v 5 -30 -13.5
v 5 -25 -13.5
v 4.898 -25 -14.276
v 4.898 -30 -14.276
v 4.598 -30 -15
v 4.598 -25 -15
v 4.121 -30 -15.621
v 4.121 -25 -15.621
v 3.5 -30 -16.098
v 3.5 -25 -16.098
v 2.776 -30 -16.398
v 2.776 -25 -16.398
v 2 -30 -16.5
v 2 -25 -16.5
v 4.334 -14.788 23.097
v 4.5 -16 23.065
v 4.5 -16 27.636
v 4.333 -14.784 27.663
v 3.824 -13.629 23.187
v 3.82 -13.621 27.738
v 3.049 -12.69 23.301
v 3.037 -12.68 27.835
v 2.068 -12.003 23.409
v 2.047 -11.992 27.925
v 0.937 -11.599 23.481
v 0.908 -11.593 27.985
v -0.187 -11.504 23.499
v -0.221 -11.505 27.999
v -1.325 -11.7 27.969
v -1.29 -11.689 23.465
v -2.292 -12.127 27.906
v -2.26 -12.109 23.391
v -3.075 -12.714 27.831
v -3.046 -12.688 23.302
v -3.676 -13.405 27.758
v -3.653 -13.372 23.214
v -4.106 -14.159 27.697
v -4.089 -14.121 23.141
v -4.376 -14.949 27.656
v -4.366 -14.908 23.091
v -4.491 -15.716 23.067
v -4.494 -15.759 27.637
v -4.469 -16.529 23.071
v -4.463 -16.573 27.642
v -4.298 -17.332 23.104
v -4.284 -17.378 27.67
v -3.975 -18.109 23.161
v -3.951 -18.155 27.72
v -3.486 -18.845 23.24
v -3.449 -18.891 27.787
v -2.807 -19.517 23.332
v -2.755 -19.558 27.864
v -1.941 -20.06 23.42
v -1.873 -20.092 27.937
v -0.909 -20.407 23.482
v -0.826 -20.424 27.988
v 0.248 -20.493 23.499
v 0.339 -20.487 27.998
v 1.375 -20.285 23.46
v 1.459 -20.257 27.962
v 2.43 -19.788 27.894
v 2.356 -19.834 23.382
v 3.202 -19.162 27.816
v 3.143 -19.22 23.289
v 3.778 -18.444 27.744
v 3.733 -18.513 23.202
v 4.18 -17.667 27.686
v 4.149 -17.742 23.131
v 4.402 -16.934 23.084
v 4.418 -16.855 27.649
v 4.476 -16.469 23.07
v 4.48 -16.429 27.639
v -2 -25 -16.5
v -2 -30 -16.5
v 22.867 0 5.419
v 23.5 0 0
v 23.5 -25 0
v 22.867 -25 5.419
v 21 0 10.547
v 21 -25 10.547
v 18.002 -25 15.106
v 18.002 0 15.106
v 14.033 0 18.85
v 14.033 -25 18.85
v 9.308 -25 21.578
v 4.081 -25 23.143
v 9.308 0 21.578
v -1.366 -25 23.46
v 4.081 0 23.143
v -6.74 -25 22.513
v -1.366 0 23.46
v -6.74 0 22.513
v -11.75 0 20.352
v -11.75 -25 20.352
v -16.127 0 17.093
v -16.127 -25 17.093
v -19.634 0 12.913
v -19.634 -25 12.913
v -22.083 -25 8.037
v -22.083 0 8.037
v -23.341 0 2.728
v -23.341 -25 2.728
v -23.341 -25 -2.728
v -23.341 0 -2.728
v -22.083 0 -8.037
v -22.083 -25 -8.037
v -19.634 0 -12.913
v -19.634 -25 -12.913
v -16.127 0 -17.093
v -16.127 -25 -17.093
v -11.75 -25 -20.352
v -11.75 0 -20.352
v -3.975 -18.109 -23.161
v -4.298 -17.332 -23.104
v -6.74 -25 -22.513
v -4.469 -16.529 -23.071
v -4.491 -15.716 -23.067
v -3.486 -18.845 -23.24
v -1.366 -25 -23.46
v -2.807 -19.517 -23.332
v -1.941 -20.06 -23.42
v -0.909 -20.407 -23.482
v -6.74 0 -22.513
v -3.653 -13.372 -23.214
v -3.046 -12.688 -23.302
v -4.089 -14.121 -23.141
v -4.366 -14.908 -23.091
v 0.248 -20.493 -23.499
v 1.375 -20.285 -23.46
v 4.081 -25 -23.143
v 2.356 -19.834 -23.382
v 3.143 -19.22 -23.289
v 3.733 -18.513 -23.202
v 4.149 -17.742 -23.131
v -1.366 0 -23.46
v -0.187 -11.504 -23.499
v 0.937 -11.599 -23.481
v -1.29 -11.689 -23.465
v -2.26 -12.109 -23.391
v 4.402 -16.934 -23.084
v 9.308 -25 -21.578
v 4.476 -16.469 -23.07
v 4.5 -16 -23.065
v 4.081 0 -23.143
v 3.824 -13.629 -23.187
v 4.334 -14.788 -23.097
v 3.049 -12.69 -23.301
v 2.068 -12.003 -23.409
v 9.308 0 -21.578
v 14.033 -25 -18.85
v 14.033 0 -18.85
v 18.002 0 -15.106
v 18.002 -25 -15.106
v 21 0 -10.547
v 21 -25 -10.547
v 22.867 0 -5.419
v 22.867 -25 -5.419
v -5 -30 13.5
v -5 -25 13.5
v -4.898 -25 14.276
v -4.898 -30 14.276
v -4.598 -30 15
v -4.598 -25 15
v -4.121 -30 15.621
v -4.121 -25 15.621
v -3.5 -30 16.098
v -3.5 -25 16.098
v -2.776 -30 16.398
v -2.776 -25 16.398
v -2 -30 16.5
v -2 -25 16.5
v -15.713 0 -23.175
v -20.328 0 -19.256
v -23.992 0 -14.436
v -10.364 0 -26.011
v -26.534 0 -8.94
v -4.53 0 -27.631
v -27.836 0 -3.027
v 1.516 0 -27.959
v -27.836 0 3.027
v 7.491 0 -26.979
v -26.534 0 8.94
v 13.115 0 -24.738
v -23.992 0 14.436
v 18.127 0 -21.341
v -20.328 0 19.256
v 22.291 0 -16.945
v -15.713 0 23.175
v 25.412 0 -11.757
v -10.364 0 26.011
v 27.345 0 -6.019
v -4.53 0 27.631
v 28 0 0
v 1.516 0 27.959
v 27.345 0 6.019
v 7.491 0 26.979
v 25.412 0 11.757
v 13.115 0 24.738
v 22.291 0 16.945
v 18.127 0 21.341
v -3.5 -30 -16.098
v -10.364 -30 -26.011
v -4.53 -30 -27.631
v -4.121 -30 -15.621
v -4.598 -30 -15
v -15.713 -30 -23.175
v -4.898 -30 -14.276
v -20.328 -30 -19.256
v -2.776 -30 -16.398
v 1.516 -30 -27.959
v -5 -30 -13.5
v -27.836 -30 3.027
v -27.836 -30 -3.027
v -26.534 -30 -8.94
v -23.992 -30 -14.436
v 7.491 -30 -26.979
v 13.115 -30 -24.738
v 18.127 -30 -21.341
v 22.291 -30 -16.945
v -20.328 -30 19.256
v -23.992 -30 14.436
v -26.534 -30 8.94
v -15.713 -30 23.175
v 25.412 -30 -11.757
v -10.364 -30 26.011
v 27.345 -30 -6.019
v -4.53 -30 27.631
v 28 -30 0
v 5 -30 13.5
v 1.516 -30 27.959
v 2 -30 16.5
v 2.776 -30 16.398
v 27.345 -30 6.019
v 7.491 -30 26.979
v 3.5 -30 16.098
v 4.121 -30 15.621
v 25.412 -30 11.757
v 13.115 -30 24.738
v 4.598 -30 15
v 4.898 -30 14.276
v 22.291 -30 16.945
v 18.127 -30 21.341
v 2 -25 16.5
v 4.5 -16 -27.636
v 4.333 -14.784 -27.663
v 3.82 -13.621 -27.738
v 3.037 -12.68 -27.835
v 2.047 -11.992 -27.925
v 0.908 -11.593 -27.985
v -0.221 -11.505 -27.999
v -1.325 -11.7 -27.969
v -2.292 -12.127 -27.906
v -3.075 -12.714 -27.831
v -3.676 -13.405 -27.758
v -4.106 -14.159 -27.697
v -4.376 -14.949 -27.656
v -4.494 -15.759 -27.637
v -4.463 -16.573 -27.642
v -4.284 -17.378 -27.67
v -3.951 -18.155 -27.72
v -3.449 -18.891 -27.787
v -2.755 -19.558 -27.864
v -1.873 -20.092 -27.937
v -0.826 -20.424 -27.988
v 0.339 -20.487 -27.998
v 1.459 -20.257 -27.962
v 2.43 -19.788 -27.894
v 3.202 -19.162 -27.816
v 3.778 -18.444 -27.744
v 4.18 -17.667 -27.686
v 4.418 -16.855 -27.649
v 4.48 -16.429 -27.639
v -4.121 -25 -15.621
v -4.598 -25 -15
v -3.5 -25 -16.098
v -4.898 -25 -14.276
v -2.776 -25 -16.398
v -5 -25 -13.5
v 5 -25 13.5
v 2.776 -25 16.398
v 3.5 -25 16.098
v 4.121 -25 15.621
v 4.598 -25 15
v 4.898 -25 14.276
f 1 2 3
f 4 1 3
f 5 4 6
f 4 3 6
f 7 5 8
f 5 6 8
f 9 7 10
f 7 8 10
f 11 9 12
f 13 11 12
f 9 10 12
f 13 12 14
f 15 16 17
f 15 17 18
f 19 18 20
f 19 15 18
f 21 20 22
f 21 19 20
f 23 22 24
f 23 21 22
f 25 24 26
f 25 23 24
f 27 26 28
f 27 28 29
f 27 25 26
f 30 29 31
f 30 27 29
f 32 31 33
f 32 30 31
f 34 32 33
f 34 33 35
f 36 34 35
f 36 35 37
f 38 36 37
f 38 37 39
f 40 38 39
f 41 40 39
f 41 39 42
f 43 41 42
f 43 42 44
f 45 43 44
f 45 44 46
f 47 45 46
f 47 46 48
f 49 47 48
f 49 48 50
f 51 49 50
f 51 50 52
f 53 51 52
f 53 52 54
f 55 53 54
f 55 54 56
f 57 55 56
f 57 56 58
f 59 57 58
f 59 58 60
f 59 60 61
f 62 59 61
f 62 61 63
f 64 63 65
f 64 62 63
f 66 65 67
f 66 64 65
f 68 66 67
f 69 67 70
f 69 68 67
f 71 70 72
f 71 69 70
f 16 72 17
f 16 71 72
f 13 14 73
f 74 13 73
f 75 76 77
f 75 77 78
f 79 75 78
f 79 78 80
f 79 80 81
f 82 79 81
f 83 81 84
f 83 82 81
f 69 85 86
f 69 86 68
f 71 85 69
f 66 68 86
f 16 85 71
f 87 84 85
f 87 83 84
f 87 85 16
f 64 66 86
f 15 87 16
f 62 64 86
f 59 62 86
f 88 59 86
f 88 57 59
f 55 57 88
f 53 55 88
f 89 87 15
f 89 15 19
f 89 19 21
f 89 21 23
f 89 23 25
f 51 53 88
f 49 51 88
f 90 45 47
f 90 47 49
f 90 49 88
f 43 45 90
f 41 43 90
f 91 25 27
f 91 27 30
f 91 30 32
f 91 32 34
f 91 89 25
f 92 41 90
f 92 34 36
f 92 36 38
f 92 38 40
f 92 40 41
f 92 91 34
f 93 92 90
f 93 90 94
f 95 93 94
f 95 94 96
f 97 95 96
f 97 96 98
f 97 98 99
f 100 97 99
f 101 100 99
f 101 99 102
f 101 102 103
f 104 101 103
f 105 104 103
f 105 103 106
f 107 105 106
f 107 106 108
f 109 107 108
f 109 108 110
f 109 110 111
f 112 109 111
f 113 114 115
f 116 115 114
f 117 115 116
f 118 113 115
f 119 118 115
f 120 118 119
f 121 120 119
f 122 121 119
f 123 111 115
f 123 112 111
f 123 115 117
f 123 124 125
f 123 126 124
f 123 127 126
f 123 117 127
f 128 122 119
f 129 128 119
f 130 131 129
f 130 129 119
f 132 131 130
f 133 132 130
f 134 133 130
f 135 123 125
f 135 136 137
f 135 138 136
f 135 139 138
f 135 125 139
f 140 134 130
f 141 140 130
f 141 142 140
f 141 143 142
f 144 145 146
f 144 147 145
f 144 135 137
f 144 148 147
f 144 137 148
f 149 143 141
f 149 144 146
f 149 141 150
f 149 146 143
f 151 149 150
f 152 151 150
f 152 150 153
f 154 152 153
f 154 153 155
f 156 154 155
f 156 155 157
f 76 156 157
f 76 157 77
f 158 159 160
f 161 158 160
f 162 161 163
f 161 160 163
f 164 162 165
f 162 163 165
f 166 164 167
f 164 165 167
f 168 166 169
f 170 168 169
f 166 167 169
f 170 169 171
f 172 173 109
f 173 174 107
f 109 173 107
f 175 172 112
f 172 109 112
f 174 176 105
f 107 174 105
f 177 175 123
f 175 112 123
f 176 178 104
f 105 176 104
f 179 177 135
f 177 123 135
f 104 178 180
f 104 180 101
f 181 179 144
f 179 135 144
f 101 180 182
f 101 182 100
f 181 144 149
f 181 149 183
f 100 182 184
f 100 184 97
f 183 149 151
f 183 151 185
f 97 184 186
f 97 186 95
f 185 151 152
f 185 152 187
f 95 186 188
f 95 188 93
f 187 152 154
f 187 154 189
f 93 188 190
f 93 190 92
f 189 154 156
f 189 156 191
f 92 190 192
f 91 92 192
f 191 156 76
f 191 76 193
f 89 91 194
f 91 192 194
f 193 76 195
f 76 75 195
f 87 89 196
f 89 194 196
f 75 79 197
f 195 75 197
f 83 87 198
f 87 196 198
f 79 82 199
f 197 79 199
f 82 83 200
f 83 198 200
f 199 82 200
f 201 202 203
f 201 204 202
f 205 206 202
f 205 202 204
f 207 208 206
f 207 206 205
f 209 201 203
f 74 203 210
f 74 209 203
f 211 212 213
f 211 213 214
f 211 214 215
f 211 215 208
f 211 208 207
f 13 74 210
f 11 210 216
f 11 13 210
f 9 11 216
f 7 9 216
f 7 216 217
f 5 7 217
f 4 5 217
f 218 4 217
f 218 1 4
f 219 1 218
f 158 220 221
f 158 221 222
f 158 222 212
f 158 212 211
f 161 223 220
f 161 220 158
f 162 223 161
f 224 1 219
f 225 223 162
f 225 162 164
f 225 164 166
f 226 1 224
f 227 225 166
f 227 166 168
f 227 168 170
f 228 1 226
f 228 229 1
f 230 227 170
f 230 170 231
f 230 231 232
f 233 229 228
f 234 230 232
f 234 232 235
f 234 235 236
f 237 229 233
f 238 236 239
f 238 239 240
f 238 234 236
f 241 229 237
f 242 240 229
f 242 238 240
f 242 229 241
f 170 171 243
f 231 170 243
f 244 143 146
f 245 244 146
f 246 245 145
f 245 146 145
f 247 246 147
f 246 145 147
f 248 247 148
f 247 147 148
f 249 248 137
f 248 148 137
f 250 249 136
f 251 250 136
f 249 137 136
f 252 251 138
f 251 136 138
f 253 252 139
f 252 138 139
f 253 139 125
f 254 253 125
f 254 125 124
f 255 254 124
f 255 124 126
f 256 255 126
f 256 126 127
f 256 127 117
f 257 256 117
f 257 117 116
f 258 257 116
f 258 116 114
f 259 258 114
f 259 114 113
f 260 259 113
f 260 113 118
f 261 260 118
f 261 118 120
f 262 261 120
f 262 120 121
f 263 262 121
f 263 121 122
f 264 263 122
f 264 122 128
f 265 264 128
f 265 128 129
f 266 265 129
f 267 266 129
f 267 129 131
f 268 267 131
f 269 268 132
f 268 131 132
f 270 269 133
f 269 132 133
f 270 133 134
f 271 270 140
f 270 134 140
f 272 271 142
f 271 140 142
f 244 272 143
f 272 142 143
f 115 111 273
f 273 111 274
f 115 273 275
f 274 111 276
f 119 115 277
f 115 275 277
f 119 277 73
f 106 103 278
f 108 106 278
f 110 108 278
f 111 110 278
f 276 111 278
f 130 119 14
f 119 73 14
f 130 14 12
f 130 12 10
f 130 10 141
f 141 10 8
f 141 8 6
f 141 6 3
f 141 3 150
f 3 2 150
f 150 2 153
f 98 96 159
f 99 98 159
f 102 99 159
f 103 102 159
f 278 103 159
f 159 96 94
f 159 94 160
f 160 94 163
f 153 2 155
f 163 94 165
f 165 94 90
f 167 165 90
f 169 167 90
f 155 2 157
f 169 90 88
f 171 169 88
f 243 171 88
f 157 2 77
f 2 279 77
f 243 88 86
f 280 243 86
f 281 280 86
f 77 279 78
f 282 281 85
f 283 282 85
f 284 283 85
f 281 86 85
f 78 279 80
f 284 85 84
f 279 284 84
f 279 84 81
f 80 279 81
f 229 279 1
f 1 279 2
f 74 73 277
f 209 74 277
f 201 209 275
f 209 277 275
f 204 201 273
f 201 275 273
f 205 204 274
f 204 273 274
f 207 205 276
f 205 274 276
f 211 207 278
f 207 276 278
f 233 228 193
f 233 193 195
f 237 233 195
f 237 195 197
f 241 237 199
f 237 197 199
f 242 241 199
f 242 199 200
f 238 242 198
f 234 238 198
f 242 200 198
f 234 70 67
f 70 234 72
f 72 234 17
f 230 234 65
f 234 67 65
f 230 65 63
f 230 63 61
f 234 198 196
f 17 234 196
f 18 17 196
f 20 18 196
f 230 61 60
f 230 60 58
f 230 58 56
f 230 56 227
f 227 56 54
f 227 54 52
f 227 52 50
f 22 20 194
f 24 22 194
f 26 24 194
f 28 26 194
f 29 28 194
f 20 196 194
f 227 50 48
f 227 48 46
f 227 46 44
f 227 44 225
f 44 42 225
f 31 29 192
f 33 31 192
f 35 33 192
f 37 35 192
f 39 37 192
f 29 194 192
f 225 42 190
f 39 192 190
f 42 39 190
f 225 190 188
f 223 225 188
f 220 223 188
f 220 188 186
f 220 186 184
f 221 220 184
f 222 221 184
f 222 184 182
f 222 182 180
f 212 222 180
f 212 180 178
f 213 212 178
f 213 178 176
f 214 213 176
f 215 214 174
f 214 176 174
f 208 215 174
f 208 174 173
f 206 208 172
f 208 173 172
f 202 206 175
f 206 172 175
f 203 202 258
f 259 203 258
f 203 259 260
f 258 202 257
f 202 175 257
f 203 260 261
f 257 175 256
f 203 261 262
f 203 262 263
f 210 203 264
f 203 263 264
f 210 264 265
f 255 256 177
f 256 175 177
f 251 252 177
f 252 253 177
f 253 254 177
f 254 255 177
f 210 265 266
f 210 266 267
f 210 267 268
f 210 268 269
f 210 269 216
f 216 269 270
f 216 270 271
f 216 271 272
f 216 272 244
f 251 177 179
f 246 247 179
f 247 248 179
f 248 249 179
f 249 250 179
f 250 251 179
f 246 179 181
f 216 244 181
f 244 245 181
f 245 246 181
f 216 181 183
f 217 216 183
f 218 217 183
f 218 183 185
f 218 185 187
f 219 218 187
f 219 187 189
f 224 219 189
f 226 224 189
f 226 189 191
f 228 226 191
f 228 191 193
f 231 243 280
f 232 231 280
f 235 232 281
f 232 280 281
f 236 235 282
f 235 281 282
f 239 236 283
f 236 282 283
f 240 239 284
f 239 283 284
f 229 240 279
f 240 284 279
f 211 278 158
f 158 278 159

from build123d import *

# Parameters (mm, degrees)
F0_R          = 28
F0_R_2        = 23.5
F1_DEPTH      = 25
F2_R          = 28
F3_DEPTH      = 5
F5_R          = 4.5
F6_DEPTH      = 50
F6_DEPTH_BACK = 50


with BuildPart() as f1:
    # F0 (on Front) → F1 (new body)
    with BuildSketch(Plane.XZ):
        Circle(F0_R)
        Circle(F0_R_2, mode=Mode.SUBTRACT)
    extrude(amount=F1_DEPTH)

    # F2 (on face) → F3 (join)
    with BuildSketch(Plane.XZ.offset(25)):
        Circle(F2_R)
        with BuildLine():
            Line((-5, -13.5), (-5, 13.5))
            ThreePointArc((-5, 13.5), (-4.12132, 15.62132), (-2, 16.5))
            Line((-2, 16.5), (2, 16.5))
            ThreePointArc((2, 16.5), (4.12132, 15.62132), (5, 13.5))
            Line((5, 13.5), (5, -13.5))
            ThreePointArc((5, -13.5), (4.12132, -15.62132), (2, -16.5))
            Line((2, -16.5), (-2, -16.5))
            ThreePointArc((-2, -16.5), (-4.12132, -15.62132), (-5, -13.5))
        make_face(mode=Mode.SUBTRACT)
    extrude(amount=F3_DEPTH)

    # F5 (on Top) → F6 (cut, two sides)
    with BuildSketch(Plane.XY) as f6_sk:
        with Locations((0, -16)):
            Circle(F5_R)
    extrude(amount=F6_DEPTH, mode=Mode.SUBTRACT)
    extrude(f6_sk.sketch, amount=-F6_DEPTH_BACK, mode=Mode.SUBTRACT)


solid = f1.part
